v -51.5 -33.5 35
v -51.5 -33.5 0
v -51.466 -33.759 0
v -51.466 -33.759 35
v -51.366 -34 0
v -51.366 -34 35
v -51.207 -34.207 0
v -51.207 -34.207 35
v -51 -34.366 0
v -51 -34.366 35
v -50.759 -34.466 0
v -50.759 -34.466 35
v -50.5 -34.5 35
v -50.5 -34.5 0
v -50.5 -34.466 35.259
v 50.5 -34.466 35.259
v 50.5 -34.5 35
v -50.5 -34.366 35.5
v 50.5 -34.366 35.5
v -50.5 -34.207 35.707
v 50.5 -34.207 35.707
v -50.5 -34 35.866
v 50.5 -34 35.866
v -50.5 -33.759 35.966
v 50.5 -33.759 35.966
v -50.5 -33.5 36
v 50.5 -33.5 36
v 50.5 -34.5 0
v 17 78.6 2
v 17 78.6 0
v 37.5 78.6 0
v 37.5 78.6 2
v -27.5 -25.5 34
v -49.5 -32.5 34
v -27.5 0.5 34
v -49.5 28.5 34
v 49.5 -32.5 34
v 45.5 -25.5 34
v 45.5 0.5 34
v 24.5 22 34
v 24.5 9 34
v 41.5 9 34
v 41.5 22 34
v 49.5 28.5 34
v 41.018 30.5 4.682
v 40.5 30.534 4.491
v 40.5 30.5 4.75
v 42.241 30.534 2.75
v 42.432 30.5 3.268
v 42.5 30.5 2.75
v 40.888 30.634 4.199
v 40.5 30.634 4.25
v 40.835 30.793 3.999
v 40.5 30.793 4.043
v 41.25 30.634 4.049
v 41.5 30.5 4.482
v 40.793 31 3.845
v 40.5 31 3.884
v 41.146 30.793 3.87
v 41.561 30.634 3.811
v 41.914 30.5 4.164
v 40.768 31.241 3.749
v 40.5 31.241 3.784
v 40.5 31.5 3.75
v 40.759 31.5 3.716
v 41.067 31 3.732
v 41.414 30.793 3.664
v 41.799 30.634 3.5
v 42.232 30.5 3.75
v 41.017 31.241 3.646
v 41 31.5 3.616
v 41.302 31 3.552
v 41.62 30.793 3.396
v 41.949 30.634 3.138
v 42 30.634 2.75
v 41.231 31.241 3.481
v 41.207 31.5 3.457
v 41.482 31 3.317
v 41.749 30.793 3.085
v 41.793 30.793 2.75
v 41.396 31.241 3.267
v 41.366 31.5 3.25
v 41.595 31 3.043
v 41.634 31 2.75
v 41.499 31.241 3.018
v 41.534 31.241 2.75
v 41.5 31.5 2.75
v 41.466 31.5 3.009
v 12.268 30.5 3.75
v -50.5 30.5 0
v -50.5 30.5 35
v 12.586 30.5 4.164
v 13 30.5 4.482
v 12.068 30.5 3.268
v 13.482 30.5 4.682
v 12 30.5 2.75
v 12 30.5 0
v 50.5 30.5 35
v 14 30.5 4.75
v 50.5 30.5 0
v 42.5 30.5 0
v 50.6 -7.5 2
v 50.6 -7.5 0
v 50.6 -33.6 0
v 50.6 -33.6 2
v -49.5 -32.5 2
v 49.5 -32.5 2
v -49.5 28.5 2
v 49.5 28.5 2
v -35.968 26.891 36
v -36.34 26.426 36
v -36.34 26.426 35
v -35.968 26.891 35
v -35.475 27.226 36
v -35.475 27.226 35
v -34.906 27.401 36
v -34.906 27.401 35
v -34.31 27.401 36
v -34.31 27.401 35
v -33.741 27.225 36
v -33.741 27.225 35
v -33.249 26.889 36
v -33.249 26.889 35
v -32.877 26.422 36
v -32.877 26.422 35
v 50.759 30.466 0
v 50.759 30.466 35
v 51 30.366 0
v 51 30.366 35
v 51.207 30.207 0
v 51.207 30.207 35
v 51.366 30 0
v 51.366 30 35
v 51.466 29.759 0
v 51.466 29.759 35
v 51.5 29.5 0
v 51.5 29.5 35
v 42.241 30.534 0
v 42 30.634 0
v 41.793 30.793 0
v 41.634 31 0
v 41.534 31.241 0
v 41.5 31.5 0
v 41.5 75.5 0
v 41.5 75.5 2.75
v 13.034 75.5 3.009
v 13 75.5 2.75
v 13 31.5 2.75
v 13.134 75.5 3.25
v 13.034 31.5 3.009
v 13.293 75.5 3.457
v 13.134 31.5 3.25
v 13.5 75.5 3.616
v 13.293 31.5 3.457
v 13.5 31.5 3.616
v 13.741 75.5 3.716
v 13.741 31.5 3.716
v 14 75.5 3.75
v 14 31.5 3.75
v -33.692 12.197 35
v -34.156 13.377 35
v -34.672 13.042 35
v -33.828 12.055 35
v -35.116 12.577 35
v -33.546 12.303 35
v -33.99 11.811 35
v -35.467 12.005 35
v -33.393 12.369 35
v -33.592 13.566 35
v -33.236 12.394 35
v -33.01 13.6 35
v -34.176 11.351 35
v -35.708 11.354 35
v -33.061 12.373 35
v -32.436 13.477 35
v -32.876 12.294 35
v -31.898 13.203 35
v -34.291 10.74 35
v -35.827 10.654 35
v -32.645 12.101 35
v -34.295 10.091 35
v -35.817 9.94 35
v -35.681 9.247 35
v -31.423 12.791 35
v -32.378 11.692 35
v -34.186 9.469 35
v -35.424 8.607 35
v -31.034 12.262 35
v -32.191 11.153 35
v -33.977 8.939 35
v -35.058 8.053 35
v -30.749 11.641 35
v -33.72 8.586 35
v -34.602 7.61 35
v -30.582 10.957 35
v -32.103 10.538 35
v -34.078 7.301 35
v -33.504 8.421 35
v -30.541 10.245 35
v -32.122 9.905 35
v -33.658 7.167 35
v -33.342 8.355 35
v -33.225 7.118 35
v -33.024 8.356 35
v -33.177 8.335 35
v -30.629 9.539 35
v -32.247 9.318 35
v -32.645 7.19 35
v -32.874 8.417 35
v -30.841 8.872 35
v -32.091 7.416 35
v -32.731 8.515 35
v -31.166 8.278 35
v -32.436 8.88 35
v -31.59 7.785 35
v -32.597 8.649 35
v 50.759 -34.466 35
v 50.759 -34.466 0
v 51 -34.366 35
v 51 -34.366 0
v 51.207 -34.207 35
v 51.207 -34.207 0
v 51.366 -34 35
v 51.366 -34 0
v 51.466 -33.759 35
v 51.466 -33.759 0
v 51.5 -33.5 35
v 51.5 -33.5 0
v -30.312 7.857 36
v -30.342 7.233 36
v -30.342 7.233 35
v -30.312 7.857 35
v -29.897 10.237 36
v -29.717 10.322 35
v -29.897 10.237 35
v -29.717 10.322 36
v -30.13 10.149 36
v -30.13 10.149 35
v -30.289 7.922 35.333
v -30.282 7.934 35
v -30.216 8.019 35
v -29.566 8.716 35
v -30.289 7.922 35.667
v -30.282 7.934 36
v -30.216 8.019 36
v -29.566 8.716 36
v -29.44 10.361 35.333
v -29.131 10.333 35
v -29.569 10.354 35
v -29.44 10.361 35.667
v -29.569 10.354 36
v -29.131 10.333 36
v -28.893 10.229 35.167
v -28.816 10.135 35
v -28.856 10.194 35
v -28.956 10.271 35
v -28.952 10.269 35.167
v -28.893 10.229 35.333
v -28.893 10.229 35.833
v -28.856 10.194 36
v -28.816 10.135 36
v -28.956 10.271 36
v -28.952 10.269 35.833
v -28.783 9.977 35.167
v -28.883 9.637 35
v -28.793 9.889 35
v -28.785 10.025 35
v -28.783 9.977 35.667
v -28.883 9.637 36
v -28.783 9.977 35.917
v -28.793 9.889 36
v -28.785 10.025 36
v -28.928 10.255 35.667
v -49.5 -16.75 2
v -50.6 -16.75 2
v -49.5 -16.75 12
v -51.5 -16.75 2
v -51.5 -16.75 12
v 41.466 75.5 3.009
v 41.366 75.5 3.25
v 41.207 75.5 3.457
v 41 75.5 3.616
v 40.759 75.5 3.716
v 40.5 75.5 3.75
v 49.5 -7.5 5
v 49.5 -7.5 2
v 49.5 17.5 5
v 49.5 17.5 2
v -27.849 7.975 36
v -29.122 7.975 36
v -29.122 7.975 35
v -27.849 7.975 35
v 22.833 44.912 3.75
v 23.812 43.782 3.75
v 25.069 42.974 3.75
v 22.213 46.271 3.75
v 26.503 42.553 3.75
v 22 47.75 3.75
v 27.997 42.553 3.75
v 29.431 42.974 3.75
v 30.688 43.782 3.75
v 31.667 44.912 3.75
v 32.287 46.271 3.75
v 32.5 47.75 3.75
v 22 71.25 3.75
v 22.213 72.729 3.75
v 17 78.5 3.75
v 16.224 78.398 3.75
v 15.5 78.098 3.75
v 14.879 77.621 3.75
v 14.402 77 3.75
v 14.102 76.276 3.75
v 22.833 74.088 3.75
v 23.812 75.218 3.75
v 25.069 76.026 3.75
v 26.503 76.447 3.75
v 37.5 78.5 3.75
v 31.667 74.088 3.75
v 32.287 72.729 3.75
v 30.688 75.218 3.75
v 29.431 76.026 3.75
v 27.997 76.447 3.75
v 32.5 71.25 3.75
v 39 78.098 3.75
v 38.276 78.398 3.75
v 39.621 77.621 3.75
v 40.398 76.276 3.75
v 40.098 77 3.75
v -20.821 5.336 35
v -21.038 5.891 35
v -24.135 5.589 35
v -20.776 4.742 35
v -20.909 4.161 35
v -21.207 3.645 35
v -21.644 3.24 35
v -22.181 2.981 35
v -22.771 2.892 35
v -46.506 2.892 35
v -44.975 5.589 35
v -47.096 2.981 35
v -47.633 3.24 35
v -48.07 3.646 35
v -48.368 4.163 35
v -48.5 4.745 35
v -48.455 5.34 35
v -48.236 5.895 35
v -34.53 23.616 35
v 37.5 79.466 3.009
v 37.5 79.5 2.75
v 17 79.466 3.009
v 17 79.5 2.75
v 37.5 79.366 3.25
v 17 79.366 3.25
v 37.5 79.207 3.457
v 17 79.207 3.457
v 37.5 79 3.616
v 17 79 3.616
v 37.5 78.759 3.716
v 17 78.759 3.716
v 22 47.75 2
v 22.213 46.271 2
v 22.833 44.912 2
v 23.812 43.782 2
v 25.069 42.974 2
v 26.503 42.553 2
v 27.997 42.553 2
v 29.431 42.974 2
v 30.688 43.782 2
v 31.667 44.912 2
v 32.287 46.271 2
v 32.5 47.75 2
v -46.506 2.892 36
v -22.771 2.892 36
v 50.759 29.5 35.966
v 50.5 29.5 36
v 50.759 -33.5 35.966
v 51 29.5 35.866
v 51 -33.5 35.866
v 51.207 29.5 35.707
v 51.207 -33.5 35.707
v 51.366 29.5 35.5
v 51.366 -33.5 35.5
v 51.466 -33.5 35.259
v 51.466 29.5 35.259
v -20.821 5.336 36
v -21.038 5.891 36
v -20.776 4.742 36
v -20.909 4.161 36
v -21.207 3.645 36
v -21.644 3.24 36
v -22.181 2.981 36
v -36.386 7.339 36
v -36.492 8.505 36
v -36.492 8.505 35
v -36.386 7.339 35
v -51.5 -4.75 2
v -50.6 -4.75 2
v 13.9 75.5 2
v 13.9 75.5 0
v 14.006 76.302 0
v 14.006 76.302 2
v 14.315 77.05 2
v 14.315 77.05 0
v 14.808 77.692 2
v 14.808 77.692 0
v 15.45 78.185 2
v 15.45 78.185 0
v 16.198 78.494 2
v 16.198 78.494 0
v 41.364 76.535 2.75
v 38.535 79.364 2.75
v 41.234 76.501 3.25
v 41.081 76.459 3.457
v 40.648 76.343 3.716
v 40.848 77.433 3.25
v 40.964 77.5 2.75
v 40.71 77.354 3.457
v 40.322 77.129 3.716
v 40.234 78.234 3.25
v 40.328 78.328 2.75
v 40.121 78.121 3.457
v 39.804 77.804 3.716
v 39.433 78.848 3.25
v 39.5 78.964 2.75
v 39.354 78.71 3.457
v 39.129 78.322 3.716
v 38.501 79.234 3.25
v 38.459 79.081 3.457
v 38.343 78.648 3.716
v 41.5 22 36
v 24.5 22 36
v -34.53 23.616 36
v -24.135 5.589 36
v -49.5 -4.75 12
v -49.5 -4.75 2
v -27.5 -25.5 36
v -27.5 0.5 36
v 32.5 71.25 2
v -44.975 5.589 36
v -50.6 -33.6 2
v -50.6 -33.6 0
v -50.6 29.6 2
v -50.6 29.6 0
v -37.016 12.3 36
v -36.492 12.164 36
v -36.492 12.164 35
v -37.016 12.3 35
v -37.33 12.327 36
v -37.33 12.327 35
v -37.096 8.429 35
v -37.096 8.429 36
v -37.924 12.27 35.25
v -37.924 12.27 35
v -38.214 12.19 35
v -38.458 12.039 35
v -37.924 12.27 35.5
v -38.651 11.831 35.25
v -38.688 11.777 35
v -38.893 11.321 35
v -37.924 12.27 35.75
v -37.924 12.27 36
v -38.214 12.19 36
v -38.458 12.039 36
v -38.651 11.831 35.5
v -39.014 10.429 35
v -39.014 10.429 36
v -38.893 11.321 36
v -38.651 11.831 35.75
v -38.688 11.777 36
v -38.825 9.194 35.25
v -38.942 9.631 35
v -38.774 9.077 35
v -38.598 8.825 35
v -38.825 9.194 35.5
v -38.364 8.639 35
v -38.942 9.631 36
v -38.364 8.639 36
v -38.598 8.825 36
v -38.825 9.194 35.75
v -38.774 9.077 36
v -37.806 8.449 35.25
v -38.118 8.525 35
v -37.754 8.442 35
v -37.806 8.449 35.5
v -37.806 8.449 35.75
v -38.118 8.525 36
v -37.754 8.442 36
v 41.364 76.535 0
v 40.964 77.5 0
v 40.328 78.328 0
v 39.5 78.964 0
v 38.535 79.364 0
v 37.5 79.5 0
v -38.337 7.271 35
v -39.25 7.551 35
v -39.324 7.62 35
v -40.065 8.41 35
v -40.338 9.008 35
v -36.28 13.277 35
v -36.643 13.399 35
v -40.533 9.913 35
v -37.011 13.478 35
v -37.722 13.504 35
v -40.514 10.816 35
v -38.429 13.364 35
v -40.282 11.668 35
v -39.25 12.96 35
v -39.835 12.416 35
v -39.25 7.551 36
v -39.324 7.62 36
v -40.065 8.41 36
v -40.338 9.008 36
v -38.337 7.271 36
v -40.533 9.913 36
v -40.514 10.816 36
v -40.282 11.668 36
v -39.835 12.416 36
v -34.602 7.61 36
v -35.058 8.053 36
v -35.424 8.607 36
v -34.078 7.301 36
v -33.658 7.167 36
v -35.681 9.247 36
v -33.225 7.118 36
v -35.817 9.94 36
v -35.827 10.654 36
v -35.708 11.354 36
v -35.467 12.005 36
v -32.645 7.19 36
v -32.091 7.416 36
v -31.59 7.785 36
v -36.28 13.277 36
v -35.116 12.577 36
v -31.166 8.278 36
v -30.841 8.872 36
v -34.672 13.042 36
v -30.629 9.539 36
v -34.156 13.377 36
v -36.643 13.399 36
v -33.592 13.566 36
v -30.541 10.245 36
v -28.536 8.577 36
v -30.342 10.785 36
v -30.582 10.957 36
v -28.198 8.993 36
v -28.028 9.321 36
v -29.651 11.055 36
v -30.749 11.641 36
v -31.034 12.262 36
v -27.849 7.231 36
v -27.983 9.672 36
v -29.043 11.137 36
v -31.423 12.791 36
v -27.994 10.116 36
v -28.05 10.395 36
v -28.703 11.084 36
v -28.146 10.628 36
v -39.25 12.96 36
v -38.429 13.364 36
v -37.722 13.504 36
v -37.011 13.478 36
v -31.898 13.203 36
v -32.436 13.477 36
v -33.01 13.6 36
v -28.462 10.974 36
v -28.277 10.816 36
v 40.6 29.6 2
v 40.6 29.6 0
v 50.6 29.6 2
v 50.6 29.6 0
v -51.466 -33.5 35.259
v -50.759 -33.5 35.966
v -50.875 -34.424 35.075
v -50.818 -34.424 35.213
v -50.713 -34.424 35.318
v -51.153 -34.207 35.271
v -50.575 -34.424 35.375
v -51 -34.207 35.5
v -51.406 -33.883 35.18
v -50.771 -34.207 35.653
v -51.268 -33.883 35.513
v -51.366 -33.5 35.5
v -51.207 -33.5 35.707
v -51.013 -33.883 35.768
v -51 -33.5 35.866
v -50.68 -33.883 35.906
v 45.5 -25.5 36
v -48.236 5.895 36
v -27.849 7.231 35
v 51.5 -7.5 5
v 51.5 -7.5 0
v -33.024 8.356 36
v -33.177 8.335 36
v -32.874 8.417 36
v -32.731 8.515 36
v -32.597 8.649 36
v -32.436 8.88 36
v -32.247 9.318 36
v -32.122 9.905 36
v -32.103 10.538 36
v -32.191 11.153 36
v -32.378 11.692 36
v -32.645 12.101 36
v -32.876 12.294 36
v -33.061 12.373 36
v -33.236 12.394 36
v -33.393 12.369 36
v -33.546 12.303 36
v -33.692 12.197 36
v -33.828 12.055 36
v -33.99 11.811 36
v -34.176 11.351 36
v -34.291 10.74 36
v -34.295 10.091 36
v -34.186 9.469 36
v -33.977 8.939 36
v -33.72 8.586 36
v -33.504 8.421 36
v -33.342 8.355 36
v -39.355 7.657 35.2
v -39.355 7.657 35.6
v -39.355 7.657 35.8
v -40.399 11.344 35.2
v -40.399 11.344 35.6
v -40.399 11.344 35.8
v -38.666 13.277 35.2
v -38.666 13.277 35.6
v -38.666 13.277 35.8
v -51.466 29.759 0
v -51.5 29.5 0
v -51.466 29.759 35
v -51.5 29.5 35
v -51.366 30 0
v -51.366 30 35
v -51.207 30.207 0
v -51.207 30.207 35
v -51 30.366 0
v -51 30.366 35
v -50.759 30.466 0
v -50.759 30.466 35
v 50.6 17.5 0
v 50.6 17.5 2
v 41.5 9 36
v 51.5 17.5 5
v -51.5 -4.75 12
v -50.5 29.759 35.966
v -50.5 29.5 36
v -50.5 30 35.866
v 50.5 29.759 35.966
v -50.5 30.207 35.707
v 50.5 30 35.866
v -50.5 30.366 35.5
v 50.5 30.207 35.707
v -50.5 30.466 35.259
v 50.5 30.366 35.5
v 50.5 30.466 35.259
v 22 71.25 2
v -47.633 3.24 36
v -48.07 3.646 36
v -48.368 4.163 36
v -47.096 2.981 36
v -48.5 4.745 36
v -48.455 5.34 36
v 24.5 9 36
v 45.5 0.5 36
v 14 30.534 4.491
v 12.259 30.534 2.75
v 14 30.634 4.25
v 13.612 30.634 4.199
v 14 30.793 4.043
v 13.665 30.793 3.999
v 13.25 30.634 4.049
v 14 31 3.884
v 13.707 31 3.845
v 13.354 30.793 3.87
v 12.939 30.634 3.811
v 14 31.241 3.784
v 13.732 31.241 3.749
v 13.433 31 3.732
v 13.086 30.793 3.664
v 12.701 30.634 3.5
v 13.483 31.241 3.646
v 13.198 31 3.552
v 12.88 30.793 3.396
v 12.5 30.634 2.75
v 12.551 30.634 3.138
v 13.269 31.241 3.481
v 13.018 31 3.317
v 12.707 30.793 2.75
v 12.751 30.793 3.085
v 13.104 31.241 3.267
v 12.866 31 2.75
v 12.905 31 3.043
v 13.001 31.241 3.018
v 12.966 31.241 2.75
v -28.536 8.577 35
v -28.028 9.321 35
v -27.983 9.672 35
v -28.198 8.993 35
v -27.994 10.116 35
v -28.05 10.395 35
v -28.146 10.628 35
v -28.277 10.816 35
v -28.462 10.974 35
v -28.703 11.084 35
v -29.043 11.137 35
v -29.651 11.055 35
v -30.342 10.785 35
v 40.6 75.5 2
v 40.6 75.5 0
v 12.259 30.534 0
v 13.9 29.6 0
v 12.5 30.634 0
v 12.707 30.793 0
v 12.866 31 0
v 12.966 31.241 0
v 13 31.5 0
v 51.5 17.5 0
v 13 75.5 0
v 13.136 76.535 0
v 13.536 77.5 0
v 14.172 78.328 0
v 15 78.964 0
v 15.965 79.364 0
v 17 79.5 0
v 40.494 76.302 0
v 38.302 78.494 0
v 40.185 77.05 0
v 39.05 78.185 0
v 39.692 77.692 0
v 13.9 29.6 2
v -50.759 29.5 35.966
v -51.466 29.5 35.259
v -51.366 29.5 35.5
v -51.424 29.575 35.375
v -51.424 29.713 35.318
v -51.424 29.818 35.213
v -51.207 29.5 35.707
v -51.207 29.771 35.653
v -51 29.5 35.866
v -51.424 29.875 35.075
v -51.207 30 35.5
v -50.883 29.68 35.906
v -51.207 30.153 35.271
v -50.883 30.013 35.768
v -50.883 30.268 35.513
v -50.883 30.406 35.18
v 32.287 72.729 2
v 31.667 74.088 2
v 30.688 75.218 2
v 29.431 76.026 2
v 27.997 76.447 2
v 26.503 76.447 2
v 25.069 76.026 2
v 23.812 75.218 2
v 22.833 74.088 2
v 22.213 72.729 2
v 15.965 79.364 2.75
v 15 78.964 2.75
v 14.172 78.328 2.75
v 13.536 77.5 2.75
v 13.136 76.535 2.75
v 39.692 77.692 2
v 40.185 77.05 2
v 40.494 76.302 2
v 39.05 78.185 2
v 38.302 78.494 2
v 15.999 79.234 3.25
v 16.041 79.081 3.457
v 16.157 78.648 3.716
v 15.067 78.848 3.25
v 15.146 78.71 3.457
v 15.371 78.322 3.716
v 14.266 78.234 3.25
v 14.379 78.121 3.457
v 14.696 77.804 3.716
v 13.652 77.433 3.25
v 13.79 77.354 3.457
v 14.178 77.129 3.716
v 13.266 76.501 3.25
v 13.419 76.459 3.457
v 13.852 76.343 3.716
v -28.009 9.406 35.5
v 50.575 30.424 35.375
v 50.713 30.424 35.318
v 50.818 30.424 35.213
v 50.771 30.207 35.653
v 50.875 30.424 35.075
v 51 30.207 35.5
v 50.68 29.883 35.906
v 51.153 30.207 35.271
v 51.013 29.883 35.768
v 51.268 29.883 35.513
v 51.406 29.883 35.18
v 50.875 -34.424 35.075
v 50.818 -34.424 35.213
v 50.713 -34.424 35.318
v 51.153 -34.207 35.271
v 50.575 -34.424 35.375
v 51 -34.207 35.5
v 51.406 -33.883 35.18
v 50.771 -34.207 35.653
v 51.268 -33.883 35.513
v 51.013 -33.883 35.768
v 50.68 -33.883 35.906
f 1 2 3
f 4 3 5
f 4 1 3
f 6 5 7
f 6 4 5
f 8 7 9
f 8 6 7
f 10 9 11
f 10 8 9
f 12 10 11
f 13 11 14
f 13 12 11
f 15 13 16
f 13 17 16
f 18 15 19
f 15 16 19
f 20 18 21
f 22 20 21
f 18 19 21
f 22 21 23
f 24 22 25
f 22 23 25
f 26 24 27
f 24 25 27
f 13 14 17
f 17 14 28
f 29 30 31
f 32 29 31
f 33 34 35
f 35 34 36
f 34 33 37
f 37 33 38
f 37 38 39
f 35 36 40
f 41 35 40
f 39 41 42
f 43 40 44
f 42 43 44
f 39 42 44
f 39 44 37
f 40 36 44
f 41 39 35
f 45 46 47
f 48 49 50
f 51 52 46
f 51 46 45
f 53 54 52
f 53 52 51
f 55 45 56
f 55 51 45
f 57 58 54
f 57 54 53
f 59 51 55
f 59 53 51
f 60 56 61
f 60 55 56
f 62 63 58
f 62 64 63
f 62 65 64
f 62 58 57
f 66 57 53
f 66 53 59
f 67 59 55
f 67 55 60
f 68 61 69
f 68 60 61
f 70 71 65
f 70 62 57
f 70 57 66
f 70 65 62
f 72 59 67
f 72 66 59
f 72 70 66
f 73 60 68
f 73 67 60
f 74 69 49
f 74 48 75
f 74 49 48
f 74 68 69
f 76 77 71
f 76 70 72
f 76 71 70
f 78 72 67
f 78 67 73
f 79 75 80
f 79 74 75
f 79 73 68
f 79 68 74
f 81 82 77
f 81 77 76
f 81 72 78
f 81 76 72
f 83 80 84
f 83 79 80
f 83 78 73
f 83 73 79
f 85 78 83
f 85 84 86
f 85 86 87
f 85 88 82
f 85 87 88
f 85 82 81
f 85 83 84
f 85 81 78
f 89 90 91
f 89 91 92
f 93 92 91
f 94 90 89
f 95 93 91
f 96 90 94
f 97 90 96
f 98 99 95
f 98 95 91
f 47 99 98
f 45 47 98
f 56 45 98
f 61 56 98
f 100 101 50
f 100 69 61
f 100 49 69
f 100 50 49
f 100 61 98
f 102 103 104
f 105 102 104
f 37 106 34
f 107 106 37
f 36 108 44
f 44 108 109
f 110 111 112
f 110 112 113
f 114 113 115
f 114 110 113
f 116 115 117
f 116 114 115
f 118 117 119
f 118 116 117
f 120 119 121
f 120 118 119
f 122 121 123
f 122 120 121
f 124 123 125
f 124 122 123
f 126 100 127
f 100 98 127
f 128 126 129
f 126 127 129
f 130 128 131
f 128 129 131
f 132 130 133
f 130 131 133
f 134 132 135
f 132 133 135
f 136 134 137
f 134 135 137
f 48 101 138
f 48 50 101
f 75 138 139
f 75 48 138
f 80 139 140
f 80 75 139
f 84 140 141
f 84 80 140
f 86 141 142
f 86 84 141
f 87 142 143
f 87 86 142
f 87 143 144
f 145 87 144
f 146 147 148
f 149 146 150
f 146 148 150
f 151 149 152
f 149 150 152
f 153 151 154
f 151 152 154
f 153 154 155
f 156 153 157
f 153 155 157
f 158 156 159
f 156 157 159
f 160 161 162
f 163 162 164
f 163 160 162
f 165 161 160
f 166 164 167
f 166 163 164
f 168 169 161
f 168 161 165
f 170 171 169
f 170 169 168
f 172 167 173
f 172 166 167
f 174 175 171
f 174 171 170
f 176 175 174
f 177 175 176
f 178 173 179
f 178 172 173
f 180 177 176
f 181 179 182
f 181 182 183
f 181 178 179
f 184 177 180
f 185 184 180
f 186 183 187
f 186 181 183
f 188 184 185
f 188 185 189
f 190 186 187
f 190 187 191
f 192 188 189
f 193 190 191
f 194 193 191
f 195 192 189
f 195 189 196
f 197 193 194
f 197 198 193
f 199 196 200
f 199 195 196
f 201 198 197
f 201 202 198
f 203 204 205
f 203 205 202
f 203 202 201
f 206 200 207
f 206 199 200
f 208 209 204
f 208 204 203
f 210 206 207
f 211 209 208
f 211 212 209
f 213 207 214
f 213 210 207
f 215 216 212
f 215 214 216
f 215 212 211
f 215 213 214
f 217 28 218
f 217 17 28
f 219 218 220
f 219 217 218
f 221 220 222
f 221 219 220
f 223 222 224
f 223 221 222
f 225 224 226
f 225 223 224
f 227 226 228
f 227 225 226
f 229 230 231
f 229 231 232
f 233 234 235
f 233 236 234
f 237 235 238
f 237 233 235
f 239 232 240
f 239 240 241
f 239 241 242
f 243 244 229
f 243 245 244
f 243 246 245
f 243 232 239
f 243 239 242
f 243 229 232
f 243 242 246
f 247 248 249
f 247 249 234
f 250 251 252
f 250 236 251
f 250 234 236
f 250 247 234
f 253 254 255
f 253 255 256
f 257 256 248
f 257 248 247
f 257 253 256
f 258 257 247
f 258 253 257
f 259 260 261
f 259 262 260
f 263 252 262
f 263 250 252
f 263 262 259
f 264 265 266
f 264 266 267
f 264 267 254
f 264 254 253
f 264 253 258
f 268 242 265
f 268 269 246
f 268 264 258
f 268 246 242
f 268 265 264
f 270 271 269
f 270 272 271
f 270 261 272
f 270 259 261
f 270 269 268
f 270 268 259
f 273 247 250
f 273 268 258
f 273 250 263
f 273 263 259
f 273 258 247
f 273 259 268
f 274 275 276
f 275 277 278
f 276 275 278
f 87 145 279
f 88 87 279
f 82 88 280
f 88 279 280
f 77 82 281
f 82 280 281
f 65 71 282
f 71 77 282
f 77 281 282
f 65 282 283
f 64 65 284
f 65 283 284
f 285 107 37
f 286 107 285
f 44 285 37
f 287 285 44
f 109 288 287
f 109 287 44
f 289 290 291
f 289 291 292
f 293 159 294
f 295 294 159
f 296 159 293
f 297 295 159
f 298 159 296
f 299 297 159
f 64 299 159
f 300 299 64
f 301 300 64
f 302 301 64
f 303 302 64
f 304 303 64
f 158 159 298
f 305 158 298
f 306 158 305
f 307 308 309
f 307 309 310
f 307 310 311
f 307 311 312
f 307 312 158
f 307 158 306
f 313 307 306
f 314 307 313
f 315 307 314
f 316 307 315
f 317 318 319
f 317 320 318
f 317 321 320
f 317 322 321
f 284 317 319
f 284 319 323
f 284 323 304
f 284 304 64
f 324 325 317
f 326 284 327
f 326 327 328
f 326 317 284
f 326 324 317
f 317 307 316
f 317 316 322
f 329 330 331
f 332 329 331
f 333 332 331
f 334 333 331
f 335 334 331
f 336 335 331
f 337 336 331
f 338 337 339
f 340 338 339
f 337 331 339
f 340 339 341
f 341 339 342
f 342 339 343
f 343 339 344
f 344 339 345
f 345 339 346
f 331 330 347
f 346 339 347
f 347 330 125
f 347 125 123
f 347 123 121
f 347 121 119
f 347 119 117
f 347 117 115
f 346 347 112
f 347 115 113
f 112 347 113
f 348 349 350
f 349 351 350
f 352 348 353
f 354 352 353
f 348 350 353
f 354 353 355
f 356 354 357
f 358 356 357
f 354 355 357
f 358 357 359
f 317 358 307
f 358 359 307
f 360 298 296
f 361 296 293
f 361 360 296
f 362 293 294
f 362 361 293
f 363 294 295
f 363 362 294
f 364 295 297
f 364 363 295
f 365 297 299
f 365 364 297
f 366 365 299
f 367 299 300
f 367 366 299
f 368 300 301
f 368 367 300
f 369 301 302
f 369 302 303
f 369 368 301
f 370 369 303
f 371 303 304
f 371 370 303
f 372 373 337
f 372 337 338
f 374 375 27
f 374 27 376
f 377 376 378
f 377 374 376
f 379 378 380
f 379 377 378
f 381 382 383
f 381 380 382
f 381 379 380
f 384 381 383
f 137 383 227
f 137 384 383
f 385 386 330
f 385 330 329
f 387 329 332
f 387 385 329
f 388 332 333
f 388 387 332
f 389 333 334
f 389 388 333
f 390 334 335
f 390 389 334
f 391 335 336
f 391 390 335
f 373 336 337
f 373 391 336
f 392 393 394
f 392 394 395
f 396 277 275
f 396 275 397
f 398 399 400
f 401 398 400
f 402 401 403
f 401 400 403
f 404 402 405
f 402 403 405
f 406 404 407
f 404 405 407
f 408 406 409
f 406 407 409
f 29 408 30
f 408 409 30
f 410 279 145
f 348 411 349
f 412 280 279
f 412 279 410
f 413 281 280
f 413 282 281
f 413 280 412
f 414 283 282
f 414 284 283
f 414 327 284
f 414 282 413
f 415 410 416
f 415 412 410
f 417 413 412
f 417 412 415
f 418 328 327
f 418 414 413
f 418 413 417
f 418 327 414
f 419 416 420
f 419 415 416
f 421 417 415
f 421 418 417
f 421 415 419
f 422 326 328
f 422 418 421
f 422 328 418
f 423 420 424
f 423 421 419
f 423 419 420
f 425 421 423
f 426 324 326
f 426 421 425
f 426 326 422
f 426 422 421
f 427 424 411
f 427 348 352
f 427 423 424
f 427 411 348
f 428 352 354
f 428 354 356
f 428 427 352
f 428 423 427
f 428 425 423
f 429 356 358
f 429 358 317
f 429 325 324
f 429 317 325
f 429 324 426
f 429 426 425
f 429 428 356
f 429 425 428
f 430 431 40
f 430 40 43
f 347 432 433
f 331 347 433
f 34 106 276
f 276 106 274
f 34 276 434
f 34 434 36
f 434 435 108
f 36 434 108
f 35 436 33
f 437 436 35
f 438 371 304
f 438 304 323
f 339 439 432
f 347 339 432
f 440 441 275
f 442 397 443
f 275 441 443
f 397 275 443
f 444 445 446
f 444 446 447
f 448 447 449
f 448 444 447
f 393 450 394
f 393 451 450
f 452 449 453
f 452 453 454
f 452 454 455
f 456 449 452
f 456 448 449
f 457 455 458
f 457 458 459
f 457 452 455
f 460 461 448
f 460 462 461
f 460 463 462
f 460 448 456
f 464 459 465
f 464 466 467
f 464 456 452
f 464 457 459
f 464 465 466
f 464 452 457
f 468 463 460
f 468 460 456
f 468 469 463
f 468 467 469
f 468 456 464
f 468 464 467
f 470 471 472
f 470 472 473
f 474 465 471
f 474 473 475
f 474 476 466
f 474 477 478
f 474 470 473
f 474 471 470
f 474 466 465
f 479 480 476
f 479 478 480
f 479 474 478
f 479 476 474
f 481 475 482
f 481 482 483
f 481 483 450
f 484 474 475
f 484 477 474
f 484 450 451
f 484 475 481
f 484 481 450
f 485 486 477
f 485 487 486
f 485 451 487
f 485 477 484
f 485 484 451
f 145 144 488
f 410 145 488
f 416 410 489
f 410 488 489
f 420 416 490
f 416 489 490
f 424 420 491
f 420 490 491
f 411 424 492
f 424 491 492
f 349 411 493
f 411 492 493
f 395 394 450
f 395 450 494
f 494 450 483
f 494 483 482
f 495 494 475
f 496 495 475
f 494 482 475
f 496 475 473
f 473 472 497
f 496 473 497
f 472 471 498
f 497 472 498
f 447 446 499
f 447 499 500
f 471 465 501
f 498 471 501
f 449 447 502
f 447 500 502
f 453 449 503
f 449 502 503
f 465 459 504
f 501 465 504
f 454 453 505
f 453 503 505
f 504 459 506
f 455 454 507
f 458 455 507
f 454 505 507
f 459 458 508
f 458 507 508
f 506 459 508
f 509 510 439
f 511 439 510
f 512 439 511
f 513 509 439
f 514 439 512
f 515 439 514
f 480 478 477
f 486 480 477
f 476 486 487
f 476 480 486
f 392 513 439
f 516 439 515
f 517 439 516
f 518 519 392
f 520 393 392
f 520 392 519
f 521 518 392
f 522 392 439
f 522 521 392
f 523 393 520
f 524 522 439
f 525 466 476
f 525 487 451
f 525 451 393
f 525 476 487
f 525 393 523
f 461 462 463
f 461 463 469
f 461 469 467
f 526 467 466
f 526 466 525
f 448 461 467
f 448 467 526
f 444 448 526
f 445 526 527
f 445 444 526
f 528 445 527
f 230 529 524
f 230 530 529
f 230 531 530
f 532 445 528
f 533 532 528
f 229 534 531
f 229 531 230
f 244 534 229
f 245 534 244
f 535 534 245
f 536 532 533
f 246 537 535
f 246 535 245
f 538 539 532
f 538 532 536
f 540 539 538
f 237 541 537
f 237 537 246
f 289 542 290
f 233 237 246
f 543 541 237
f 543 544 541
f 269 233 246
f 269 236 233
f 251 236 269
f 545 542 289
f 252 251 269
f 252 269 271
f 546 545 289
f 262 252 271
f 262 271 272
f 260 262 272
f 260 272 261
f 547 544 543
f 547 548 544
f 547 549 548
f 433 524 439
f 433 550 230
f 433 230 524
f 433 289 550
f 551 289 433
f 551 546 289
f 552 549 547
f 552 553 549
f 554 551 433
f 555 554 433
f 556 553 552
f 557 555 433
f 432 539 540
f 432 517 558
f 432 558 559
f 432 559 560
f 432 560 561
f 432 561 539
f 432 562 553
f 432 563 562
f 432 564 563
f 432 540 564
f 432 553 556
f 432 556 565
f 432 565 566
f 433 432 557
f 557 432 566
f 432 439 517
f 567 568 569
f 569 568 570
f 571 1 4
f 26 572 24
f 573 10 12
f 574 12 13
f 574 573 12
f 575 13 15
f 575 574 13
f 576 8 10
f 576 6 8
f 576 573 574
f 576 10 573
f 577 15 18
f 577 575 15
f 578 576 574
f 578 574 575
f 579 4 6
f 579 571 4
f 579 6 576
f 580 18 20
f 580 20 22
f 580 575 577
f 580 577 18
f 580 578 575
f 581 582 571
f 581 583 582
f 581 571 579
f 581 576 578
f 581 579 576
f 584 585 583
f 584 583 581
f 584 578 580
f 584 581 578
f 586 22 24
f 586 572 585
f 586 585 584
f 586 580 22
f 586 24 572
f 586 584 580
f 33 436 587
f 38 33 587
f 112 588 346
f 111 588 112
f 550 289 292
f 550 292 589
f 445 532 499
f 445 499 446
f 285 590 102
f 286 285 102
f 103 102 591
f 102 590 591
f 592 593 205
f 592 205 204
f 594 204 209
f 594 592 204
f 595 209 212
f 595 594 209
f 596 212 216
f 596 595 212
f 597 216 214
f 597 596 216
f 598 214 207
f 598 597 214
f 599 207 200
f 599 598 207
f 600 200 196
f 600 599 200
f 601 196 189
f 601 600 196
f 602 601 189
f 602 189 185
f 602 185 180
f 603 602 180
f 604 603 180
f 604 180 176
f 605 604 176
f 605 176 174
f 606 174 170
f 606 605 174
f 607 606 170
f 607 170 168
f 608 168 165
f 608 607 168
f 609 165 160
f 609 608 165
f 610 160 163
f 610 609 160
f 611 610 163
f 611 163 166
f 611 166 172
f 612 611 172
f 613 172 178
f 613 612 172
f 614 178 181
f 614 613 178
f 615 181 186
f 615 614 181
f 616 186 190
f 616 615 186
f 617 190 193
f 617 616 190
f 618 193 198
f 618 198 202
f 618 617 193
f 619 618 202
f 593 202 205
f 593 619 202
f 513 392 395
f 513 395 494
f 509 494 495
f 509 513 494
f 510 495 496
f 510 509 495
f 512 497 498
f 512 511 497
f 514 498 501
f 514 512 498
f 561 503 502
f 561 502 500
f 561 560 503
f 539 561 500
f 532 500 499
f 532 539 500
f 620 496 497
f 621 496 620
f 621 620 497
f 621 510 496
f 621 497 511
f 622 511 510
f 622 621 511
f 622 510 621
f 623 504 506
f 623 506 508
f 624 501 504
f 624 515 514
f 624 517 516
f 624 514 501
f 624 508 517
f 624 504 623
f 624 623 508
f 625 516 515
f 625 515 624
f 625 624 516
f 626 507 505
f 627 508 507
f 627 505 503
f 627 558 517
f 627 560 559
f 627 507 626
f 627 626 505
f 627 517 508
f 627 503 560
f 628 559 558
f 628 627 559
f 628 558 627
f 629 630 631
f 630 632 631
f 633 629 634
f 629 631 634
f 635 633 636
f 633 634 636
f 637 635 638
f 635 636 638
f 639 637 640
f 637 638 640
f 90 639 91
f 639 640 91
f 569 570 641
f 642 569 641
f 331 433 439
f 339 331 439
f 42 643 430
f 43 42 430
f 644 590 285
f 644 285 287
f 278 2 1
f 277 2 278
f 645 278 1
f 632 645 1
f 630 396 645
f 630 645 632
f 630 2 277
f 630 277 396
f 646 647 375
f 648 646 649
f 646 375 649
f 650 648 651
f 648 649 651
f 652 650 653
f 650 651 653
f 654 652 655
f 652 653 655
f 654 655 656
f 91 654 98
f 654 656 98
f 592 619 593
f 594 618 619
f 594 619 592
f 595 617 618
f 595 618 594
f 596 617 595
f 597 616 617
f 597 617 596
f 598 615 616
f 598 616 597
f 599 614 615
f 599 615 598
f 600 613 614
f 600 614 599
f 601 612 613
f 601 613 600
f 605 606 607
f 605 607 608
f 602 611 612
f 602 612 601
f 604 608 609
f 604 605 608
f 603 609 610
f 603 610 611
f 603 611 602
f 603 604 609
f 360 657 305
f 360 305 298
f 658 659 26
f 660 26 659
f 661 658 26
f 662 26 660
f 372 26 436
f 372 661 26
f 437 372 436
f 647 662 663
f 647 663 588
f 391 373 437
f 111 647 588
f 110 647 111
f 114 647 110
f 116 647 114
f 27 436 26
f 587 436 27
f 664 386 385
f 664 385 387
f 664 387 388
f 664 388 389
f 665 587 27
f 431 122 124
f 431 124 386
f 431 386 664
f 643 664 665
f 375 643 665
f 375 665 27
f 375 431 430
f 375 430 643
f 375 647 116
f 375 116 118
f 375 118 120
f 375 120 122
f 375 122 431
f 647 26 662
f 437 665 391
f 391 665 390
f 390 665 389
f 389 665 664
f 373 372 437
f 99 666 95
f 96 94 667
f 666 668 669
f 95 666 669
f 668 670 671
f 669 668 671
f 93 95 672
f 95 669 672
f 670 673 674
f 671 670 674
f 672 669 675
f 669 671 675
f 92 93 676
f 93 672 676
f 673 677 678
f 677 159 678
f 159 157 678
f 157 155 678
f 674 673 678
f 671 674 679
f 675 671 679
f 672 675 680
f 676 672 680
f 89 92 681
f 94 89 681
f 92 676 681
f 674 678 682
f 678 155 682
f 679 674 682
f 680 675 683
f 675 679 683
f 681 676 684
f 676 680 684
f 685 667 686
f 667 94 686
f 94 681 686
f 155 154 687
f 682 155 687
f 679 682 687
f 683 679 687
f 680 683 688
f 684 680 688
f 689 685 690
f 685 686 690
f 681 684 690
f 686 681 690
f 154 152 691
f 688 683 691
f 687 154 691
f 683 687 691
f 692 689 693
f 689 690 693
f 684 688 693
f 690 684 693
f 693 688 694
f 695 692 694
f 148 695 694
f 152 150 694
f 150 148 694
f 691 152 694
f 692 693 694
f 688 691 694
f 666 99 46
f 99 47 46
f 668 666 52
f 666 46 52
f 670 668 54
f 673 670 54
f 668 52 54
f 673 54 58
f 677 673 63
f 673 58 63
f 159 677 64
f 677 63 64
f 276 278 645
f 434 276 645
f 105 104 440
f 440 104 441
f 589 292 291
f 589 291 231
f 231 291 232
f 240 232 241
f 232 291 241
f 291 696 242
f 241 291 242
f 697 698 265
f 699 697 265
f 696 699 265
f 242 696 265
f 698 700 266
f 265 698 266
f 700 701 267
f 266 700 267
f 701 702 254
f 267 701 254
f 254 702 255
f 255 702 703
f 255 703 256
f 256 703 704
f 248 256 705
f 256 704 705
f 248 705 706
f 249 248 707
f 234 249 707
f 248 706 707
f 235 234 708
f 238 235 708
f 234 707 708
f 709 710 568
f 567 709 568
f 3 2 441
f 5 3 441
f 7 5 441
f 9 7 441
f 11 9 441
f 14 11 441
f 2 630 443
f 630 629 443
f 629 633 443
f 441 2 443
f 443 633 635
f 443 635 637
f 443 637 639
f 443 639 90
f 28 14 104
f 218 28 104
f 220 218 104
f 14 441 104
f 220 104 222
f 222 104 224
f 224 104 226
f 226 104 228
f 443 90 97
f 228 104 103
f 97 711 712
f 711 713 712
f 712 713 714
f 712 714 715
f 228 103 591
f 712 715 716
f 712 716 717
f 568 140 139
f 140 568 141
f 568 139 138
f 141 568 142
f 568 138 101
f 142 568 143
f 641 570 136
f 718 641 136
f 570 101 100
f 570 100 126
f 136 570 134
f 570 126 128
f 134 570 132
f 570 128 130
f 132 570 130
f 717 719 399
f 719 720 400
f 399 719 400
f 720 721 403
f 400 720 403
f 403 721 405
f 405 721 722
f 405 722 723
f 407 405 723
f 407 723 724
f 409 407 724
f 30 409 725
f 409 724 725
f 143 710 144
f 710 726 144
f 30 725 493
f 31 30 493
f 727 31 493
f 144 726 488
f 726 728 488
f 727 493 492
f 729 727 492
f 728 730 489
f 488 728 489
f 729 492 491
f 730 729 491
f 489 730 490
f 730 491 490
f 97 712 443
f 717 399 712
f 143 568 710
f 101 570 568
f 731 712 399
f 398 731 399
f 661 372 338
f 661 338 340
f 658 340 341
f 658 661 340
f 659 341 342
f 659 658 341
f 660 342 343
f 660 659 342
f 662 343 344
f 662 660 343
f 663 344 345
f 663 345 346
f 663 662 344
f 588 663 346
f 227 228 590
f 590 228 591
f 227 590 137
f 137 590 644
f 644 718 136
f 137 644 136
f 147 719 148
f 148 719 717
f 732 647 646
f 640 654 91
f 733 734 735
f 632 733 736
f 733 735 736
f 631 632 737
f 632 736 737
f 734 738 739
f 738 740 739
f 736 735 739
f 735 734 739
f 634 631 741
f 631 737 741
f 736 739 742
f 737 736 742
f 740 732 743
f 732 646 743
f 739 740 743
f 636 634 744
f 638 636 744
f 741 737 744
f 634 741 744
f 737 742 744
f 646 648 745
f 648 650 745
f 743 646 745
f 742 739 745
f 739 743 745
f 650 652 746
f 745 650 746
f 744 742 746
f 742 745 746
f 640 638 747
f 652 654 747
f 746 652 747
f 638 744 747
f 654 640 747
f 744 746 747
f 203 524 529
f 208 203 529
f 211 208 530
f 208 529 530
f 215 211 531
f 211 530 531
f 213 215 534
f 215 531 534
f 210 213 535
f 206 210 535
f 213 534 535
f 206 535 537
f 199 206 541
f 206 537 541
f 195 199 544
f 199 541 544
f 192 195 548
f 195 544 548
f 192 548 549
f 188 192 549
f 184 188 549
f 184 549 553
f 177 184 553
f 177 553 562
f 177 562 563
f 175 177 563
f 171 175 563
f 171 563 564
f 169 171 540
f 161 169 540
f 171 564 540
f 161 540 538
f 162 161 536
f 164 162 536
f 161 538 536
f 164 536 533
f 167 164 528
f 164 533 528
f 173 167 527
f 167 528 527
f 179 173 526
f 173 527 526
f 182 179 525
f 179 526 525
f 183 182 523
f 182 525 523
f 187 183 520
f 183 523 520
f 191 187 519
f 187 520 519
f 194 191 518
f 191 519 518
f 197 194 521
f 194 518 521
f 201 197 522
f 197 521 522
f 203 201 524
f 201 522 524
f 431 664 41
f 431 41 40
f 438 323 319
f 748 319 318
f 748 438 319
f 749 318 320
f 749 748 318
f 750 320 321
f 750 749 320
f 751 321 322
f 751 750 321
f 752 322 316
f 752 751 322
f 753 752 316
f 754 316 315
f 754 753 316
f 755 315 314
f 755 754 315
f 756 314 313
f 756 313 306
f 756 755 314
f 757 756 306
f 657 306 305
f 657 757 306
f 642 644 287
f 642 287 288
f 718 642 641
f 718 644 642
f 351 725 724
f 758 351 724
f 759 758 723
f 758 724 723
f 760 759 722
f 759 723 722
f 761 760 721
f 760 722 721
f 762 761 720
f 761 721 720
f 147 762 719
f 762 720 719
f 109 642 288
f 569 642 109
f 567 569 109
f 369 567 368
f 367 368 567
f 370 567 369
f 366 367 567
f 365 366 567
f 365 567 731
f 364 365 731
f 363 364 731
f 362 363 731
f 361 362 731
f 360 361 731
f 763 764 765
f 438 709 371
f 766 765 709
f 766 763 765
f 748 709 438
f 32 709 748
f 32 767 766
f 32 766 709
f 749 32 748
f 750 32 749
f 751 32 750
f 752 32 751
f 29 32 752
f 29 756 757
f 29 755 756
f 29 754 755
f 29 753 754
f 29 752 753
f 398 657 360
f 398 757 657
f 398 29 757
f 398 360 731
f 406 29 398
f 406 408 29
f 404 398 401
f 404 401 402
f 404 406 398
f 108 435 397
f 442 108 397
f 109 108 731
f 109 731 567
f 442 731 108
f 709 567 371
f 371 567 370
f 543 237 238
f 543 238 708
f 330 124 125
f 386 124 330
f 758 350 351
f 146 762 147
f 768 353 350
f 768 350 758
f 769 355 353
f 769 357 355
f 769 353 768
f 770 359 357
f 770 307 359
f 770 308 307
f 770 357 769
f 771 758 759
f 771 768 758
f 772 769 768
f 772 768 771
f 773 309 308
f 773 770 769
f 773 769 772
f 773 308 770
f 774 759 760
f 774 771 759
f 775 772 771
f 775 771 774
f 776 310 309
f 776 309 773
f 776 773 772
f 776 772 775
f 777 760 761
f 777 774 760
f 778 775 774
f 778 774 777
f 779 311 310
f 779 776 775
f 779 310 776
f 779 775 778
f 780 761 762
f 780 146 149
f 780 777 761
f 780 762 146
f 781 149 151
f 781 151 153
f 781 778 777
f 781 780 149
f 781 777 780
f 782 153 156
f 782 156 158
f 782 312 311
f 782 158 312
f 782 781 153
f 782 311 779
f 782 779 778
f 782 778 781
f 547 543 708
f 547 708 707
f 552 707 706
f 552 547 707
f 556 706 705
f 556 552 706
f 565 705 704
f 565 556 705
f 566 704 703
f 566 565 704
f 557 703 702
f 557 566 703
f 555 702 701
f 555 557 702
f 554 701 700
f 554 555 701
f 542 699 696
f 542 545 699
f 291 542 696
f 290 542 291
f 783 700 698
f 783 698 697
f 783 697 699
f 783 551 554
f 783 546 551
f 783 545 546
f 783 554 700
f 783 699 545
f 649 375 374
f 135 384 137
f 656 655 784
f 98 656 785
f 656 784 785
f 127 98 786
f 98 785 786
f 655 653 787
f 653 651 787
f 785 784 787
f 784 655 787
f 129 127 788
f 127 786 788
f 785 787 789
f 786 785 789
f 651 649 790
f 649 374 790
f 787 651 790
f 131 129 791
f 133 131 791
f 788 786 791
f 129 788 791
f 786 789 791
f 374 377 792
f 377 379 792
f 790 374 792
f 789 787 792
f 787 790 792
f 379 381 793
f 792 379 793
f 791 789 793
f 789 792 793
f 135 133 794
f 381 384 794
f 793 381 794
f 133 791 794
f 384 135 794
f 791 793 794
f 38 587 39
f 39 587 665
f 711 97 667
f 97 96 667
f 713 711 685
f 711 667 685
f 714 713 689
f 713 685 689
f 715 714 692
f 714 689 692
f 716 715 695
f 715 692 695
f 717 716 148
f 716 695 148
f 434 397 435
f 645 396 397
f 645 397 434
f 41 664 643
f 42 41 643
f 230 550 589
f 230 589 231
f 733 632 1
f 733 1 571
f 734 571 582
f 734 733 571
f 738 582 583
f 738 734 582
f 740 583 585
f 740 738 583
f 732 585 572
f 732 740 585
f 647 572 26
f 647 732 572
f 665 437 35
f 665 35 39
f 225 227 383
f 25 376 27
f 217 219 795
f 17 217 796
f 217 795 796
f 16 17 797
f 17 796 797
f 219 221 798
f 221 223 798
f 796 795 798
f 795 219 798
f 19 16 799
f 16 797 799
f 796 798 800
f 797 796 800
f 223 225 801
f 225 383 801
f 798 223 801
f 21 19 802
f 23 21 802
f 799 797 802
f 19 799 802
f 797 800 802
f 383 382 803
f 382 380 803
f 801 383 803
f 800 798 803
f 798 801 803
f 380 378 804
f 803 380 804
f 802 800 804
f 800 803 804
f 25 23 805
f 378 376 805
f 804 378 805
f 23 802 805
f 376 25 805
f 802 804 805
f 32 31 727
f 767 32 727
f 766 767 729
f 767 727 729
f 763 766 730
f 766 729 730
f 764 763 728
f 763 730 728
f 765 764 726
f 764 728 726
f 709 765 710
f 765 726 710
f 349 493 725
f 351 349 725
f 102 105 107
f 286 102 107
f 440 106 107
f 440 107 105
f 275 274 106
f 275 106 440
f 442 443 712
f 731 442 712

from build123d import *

# Parameters (mm, degrees)
CROQUIS1_W              = 103
CROQUIS1_H              = 65
SALIENTE_EXTRUIR2_DEPTH = 36
VACIADO7_T              = -2
CORTAR_EXTRUIR28_REACH  = 73.683
CROQUIS12_W             = 73
CROQUIS12_H             = 26
SALIENTE_EXTRUIR3_DEPTH = 3.75
CORTAR_EXTRUIR11_DEPTH  = 2
CORTAR_EXTRUIR17_REACH  = 137.001
CROQUIS16_W             = 10
CROQUIS16_H             = 12
CORTAR_EXTRUIR29_REACH  = 103.334
CROQUIS30_W             = 17
CROQUIS30_H             = 13
CROQUIS20_RX            = 3.244161213
CROQUIS20_RY            = 2.649478984
CROQUIS20_RX_2          = 2.029667585
CROQUIS20_RY_2          = 1.104878059
CORTAR_EXTRUIR24_DEPTH  = 1
CORTAR_EXTRUIR30_REACH  = 137.001
CROQUIS31_W             = 5
CROQUIS31_H             = 25
REDONDEO1_R             = 1


with BuildPart() as part:
    # Croquis1 → Saliente-Extruir2 (new body)
    with BuildSketch(Plane.XY):
        with Locations((0, -2)):
            Rectangle(CROQUIS1_W, CROQUIS1_H)
    extrude(amount=SALIENTE_EXTRUIR2_DEPTH)

    # Vaciado7
    vaciado7_openings = [part.faces().sort_by_distance(p)[0] for p in [
        (0, -2, 0),
    ]]
    offset(amount=VACIADO7_T, openings=vaciado7_openings, kind=Kind.INTERSECTION)

    # Croquis12 → Cortar-Extruir28 (cut, up to next)
    with BuildSketch(Plane.XY.offset(36), mode=Mode.PRIVATE) as cortar_extruir28_sk1:
        with Locations((9, -12.5)):
            Rectangle(CROQUIS12_W, CROQUIS12_H)
    cortar_extruir28_tool1 = extrude(cortar_extruir28_sk1.sketch, amount=-CORTAR_EXTRUIR28_REACH, mode=Mode.PRIVATE) & part.part
    add(cortar_extruir28_tool1.solids().sort_by_distance((9, -12.5, 36))[0], mode=Mode.SUBTRACT)

    # Croquis29 → Saliente-Extruir3 (add)
    with BuildSketch(Plane(origin=(0, 0, 0), x_dir=(-1, 0, 0), z_dir=(0, 0, -1))):
        with BuildLine():
            Line((-13, 75.5), (-13, 30.5))
            Line((-13, 30.5), (-41.5, 30.5))
            Line((-41.5, 30.5), (-41.5, 75.5))
            ThreePointArc((-41.5, 75.5), (-40.328427125, 78.328427125), (-37.5, 79.5))
            Line((-37.5, 79.5), (-17, 79.5))
            ThreePointArc((-17, 79.5), (-14.171572875, 78.328427125), (-13, 75.5))
        make_face()
        with BuildLine():
            Line((-22, 71.25), (-22, 47.75))
            ThreePointArc((-22, 47.75), (-27.25, 42.5), (-32.5, 47.75))
            Line((-32.5, 47.75), (-32.5, 71.25))
            ThreePointArc((-32.5, 71.25), (-27.25, 76.5), (-22, 71.25))
        make_face(mode=Mode.SUBTRACT)
    extrude(amount=-SALIENTE_EXTRUIR3_DEPTH)

    # Croquis14 → Cortar-Extruir11 (cut)
    with BuildSketch(Plane(origin=(0, 0, 0), x_dir=(-1, 0, 0), z_dir=(0, 0, -1))):
        with BuildLine():
            Line((50.6, -33.6), (50.6, 29.6))
            Line((50.6, 29.6), (-13.9, 29.6))
            Line((-13.9, 29.6), (-13.9, 75.5))
            ThreePointArc((-13.9, 75.5), (-14.807968978, 77.692031022), (-17, 78.6))
            Line((-17, 78.6), (-37.5, 78.6))
            ThreePointArc((-37.5, 78.6), (-39.692031022, 77.692031022), (-40.6, 75.5))
            Line((-40.6, 75.5), (-40.6, 29.6))
            Line((-40.6, 29.6), (-50.6, 29.6))
            Line((-50.6, 29.6), (-50.6, -33.6))
            Line((-50.6, -33.6), (50.6, -33.6))
        make_face()
    extrude(amount=-CORTAR_EXTRUIR11_DEPTH, mode=Mode.SUBTRACT)

    # Croquis16 → Cortar-Extruir17 (cut, up to next)
    with BuildSketch(Plane.ZY.offset(51.5), mode=Mode.PRIVATE) as cortar_extruir17_sk1:
        with Locations((7, -10.75)):
            Rectangle(CROQUIS16_W, CROQUIS16_H)
    cortar_extruir17_tool1 = extrude(cortar_extruir17_sk1.sketch, amount=-CORTAR_EXTRUIR17_REACH, mode=Mode.PRIVATE) & part.part
    add(cortar_extruir17_tool1.solids().sort_by_distance((-51.5, -10.75, 7))[0], mode=Mode.SUBTRACT)

    # Croquis30 → Cortar-Extruir29 (cut, up to next)
    with BuildSketch(Plane.XY.offset(36), mode=Mode.PRIVATE) as cortar_extruir29_sk1:
        with Locations((33, 15.5)):
            Rectangle(CROQUIS30_W, CROQUIS30_H)
    cortar_extruir29_tool1 = extrude(cortar_extruir29_sk1.sketch, amount=-CORTAR_EXTRUIR29_REACH, mode=Mode.PRIVATE) & part.part
    add(cortar_extruir29_tool1.solids().sort_by_distance((33, 15.5, 36))[0], mode=Mode.SUBTRACT)

    # Croquis20 → Cortar-Extruir24 (cut)
    # profile 1 of 4: a face of its own
    with BuildSketch(Plane.XY.offset(36)):
        with BuildLine():
            Line((-32.877371929, 26.422410606), (-21.038034651, 5.891314445))
            ThreePointArc((-21.038034651, 5.891314445), (-21.038818093, 3.891767038), (-22.770607635, 2.892219426))
            Line((-22.770607635, 2.892219426), (-46.505903571, 2.892219426))
            ThreePointArc((-46.505903571, 2.892219426), (-48.238726232, 3.89355751), (-48.236407571, 5.894893803))
            Line((-48.236407571, 5.894893803), (-36.340448913, 26.425989964))
            ThreePointArc((-36.340448913, 26.425989964), (-34.607877759, 27.423314519), (-32.877371929, 26.422410606))
        make_face()
        Polygon((-24.134944502, 5.589013553), (-44.975333507, 5.589013553), (-34.530281265, 23.61600727), align=None, mode=Mode.SUBTRACT)
    # profile 2 of 4: a face of its own
    with BuildSketch(Plane.XY.offset(36)):
        with BuildLine():
            add(Edge.make_bspline(
                [(-36.492042346, 12.163564203), (-36.721798149, 12.216584773), (-36.946159791, 12.305207397), (-37.181309753, 12.322625912), (-37.428691713, 12.340950502), (-37.677714014, 12.302389838), (-37.92359773, 12.269605343), (-39.211705056, 12.097857699), (-39.130223403, 10.008481597), (-38.824947416, 9.194412297), (-38.471289709, 8.251325078), (-37.239201594, 8.380618349), (-36.492042346, 8.50514489)],
                knots=[0, 0, 0, 0, 1, 1, 1, 2, 2, 2, 3, 3, 3, 4, 4, 4, 4], degree=3))
            Line((-36.492042346, 8.50514489), (-36.386001207, 7.338692355))
            add(Edge.make_bspline(
                [(-36.386001207, 7.338692355), (-37.455699366, 7.204980085), (-38.280952684, 7.103931885), (-39.249111974, 7.550774634), (-39.294499295, 7.571722629), (-39.319806067, 7.621468727), (-39.355153113, 7.656815774), (-39.704014417, 8.005677078), (-40.006289411, 8.220522758), (-40.203482229, 8.664206599), (-40.972994564, 10.395609351), (-40.466643717, 12.540322436), (-38.665885706, 13.276996168), (-37.884767663, 13.596544459), (-37.05562877, 13.587263649), (-36.279960067, 13.276996168)],
                knots=[0, 0, 0, 0, 1, 1, 1, 2, 2, 2, 3, 3, 3, 4, 4, 4, 5, 5, 5, 5], degree=3))
            Line((-36.279960067, 13.276996168), (-36.492042346, 12.163564203))
        make_face()
    # profile 3 of 4: a face of its own
    with BuildSketch(Plane.XY.offset(36)):
        with Locations(Location((-33.188828288, 10.362256285), (0, 0, -90.640192277))):
            Ellipse(CROQUIS20_RX, CROQUIS20_RY)
        with Locations(Location((-33.20228715, 10.364336342), (0, 0, -89.299840613))):
            Ellipse(CROQUIS20_RX_2, CROQUIS20_RY_2, mode=Mode.SUBTRACT)
    # profile 4 of 4: a face of its own
    with BuildSketch(Plane.XY.offset(36)):
        with BuildLine():
            add(Edge.make_bspline(
                [(-30.341656255, 7.232651216), (-30.323982731, 7.462407018), (-30.379408301, 7.710115851), (-30.288635685, 7.921918623), (-30.185338507, 8.162945371), (-27.605603956, 10.360864831), (-29.440306569, 10.360864831), (-29.809630445, 10.360864831), (-29.823242351, 10.225365458), (-30.129573976, 10.148782552)],
                knots=[0, 0, 0, 0, 1, 1, 1, 2, 2, 2, 3, 3, 3, 3], degree=3))
            Line((-30.129573976, 10.148782552), (-30.341656255, 10.785029389))
            add(Edge.make_bspline(
                [(-30.341656255, 10.785029389), (-28.897370629, 11.507172202), (-27.775654694, 11.154718258), (-28.008751185, 9.406494576), (-28.069313134, 8.952279958), (-28.865628872, 8.254816587), (-29.12218315, 7.974939192)],
                knots=[0, 0, 0, 0, 1, 1, 1, 2, 2, 2, 2], degree=3))
            Line((-29.12218315, 7.974939192), (-27.84858536, 7.974939192))
            Line((-27.84858536, 7.974939192), (-27.84858536, 7.230680553))
            Line((-27.84858536, 7.230680553), (-30.341656255, 7.232651216))
        make_face()
    extrude(amount=-CORTAR_EXTRUIR24_DEPTH, mode=Mode.SUBTRACT)

    # Croquis31 → Cortar-Extruir30 (cut, up to next)
    with BuildSketch(Plane(origin=(51.5, 0, 0), x_dir=(0, 0, -1), z_dir=(1, 0, 0)), mode=Mode.PRIVATE) as cortar_extruir30_sk1:
        with Locations((-2.5, 5)):
            Rectangle(CROQUIS31_W, CROQUIS31_H)
    cortar_extruir30_tool1 = extrude(cortar_extruir30_sk1.sketch, amount=-CORTAR_EXTRUIR30_REACH, mode=Mode.PRIVATE) & part.part
    add(cortar_extruir30_tool1.solids().sort_by_distance((51.5, 5, 2.5))[0], mode=Mode.SUBTRACT)

    # Redondeo1
    redondeo1_edges = [part.edges().sort_by_distance(p)[0] for p in [
        (51.5, -2, 36),
        (0, 30.5, 36),
        (40.328427125, 78.328427125, 3.75),
        (27.25, 79.5, 3.75),
        (14.171572875, 78.328427125, 3.75),
        (13, 53, 3.75),
        (27.25, 30.5, 3.75),
        (13, 30.5, 1.875),
        (41.5, 53, 3.75),
        (41.5, 30.5, 1.875),
        (-51.5, -2, 36),
        (-51.5, 30.5, 18),
        (51.5, 30.5, 18),
        (51.5, -34.5, 18),
        (-51.5, -34.5, 18),
        (0, -34.5, 36),
    ]]
    fillet(redondeo1_edges, radius=REDONDEO1_R)


solid = part.part
